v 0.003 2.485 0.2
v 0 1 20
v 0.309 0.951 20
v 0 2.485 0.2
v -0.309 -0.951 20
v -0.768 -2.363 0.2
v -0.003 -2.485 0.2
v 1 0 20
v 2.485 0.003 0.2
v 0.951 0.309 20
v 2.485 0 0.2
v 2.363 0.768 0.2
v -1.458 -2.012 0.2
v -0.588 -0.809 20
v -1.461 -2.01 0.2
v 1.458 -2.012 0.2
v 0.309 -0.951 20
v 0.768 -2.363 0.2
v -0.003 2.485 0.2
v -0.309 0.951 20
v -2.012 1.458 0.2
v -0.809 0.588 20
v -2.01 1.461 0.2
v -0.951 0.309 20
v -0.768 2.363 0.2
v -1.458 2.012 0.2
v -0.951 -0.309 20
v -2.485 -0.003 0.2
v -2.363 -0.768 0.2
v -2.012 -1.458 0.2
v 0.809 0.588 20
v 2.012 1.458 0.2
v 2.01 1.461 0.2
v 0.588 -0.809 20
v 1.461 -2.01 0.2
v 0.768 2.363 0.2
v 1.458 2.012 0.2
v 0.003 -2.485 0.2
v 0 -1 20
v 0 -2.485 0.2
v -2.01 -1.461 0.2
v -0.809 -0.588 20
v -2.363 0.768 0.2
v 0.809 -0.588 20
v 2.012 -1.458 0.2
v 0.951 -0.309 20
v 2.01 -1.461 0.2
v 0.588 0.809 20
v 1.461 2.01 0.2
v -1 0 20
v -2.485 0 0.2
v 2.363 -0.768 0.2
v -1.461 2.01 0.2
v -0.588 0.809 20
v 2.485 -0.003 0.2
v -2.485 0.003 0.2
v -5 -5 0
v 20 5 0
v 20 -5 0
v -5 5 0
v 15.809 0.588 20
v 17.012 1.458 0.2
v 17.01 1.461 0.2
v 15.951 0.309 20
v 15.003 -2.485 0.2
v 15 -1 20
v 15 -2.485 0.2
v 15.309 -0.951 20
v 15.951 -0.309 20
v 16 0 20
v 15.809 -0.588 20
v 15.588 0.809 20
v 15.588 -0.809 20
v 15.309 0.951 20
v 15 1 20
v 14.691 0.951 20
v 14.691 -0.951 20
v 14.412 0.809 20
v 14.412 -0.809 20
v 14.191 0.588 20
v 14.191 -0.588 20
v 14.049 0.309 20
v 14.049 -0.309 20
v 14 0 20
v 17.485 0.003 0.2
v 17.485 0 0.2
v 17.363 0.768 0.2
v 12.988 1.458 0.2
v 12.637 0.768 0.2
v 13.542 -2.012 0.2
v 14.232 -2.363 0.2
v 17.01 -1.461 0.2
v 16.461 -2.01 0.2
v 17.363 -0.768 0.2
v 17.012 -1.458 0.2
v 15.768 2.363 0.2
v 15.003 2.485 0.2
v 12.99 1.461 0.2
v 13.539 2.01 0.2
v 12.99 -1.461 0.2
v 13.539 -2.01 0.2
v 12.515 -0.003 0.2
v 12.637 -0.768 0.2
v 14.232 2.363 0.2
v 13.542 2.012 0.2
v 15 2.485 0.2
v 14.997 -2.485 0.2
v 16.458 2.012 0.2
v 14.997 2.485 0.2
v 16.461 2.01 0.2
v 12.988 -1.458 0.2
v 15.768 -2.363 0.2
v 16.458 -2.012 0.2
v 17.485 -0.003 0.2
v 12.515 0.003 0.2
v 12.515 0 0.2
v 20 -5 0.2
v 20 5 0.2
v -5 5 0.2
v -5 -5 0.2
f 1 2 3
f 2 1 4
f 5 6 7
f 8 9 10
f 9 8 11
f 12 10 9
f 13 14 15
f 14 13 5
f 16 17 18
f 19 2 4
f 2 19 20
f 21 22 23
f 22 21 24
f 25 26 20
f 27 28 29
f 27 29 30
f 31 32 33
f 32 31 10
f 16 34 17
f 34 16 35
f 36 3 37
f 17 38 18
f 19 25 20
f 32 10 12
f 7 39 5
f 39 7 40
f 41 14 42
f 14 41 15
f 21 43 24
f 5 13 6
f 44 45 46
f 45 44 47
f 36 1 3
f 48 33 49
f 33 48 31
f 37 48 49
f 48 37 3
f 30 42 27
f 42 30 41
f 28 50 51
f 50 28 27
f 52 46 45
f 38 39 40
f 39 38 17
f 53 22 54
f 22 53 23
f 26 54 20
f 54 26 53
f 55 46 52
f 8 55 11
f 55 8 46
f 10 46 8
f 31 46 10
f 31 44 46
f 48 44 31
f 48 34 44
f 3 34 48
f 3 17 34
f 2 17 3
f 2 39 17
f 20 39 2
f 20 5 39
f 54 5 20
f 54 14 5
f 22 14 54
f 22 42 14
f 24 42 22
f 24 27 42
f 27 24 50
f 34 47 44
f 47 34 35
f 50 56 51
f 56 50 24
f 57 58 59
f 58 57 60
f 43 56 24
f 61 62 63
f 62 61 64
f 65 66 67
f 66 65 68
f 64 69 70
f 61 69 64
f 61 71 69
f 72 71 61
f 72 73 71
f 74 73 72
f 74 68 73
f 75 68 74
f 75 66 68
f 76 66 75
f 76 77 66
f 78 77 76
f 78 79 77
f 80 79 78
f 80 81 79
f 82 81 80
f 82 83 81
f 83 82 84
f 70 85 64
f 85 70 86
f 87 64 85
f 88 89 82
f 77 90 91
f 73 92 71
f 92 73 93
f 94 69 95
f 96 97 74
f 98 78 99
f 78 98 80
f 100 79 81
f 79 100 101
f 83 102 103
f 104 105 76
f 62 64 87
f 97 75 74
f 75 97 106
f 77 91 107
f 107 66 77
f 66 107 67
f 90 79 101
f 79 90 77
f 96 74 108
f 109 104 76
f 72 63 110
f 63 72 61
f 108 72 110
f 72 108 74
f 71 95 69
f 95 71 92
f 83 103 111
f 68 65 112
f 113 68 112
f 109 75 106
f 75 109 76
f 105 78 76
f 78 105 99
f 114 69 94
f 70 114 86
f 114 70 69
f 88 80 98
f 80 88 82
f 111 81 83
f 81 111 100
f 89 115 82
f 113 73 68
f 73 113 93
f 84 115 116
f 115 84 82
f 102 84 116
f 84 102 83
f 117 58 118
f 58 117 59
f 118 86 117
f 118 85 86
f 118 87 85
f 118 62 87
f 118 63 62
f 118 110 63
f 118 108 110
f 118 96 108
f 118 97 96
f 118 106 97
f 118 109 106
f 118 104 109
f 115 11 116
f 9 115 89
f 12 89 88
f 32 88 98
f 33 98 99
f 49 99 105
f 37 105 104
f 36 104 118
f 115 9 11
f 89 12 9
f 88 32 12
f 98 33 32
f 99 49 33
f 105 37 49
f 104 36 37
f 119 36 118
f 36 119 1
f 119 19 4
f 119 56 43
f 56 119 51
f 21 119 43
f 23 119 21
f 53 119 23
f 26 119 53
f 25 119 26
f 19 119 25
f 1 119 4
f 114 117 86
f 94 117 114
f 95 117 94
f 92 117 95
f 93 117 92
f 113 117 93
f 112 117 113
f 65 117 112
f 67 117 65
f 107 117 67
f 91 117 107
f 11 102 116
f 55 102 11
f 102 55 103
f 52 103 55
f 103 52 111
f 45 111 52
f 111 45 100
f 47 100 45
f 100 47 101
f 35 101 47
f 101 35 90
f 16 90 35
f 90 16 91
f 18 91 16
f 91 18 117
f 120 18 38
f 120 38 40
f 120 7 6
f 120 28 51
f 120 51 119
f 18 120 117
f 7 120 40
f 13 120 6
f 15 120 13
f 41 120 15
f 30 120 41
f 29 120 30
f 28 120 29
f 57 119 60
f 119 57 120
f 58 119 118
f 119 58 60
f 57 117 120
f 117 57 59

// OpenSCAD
$fn=20;

translate([-5, -5, 0])
  cube([15+2*5, 10, 0.2]);
  
for(i=[0:1])
  translate(i*[15, 0, 0])
    cylinder(r1=5/2, r2=2/2, h=20);
